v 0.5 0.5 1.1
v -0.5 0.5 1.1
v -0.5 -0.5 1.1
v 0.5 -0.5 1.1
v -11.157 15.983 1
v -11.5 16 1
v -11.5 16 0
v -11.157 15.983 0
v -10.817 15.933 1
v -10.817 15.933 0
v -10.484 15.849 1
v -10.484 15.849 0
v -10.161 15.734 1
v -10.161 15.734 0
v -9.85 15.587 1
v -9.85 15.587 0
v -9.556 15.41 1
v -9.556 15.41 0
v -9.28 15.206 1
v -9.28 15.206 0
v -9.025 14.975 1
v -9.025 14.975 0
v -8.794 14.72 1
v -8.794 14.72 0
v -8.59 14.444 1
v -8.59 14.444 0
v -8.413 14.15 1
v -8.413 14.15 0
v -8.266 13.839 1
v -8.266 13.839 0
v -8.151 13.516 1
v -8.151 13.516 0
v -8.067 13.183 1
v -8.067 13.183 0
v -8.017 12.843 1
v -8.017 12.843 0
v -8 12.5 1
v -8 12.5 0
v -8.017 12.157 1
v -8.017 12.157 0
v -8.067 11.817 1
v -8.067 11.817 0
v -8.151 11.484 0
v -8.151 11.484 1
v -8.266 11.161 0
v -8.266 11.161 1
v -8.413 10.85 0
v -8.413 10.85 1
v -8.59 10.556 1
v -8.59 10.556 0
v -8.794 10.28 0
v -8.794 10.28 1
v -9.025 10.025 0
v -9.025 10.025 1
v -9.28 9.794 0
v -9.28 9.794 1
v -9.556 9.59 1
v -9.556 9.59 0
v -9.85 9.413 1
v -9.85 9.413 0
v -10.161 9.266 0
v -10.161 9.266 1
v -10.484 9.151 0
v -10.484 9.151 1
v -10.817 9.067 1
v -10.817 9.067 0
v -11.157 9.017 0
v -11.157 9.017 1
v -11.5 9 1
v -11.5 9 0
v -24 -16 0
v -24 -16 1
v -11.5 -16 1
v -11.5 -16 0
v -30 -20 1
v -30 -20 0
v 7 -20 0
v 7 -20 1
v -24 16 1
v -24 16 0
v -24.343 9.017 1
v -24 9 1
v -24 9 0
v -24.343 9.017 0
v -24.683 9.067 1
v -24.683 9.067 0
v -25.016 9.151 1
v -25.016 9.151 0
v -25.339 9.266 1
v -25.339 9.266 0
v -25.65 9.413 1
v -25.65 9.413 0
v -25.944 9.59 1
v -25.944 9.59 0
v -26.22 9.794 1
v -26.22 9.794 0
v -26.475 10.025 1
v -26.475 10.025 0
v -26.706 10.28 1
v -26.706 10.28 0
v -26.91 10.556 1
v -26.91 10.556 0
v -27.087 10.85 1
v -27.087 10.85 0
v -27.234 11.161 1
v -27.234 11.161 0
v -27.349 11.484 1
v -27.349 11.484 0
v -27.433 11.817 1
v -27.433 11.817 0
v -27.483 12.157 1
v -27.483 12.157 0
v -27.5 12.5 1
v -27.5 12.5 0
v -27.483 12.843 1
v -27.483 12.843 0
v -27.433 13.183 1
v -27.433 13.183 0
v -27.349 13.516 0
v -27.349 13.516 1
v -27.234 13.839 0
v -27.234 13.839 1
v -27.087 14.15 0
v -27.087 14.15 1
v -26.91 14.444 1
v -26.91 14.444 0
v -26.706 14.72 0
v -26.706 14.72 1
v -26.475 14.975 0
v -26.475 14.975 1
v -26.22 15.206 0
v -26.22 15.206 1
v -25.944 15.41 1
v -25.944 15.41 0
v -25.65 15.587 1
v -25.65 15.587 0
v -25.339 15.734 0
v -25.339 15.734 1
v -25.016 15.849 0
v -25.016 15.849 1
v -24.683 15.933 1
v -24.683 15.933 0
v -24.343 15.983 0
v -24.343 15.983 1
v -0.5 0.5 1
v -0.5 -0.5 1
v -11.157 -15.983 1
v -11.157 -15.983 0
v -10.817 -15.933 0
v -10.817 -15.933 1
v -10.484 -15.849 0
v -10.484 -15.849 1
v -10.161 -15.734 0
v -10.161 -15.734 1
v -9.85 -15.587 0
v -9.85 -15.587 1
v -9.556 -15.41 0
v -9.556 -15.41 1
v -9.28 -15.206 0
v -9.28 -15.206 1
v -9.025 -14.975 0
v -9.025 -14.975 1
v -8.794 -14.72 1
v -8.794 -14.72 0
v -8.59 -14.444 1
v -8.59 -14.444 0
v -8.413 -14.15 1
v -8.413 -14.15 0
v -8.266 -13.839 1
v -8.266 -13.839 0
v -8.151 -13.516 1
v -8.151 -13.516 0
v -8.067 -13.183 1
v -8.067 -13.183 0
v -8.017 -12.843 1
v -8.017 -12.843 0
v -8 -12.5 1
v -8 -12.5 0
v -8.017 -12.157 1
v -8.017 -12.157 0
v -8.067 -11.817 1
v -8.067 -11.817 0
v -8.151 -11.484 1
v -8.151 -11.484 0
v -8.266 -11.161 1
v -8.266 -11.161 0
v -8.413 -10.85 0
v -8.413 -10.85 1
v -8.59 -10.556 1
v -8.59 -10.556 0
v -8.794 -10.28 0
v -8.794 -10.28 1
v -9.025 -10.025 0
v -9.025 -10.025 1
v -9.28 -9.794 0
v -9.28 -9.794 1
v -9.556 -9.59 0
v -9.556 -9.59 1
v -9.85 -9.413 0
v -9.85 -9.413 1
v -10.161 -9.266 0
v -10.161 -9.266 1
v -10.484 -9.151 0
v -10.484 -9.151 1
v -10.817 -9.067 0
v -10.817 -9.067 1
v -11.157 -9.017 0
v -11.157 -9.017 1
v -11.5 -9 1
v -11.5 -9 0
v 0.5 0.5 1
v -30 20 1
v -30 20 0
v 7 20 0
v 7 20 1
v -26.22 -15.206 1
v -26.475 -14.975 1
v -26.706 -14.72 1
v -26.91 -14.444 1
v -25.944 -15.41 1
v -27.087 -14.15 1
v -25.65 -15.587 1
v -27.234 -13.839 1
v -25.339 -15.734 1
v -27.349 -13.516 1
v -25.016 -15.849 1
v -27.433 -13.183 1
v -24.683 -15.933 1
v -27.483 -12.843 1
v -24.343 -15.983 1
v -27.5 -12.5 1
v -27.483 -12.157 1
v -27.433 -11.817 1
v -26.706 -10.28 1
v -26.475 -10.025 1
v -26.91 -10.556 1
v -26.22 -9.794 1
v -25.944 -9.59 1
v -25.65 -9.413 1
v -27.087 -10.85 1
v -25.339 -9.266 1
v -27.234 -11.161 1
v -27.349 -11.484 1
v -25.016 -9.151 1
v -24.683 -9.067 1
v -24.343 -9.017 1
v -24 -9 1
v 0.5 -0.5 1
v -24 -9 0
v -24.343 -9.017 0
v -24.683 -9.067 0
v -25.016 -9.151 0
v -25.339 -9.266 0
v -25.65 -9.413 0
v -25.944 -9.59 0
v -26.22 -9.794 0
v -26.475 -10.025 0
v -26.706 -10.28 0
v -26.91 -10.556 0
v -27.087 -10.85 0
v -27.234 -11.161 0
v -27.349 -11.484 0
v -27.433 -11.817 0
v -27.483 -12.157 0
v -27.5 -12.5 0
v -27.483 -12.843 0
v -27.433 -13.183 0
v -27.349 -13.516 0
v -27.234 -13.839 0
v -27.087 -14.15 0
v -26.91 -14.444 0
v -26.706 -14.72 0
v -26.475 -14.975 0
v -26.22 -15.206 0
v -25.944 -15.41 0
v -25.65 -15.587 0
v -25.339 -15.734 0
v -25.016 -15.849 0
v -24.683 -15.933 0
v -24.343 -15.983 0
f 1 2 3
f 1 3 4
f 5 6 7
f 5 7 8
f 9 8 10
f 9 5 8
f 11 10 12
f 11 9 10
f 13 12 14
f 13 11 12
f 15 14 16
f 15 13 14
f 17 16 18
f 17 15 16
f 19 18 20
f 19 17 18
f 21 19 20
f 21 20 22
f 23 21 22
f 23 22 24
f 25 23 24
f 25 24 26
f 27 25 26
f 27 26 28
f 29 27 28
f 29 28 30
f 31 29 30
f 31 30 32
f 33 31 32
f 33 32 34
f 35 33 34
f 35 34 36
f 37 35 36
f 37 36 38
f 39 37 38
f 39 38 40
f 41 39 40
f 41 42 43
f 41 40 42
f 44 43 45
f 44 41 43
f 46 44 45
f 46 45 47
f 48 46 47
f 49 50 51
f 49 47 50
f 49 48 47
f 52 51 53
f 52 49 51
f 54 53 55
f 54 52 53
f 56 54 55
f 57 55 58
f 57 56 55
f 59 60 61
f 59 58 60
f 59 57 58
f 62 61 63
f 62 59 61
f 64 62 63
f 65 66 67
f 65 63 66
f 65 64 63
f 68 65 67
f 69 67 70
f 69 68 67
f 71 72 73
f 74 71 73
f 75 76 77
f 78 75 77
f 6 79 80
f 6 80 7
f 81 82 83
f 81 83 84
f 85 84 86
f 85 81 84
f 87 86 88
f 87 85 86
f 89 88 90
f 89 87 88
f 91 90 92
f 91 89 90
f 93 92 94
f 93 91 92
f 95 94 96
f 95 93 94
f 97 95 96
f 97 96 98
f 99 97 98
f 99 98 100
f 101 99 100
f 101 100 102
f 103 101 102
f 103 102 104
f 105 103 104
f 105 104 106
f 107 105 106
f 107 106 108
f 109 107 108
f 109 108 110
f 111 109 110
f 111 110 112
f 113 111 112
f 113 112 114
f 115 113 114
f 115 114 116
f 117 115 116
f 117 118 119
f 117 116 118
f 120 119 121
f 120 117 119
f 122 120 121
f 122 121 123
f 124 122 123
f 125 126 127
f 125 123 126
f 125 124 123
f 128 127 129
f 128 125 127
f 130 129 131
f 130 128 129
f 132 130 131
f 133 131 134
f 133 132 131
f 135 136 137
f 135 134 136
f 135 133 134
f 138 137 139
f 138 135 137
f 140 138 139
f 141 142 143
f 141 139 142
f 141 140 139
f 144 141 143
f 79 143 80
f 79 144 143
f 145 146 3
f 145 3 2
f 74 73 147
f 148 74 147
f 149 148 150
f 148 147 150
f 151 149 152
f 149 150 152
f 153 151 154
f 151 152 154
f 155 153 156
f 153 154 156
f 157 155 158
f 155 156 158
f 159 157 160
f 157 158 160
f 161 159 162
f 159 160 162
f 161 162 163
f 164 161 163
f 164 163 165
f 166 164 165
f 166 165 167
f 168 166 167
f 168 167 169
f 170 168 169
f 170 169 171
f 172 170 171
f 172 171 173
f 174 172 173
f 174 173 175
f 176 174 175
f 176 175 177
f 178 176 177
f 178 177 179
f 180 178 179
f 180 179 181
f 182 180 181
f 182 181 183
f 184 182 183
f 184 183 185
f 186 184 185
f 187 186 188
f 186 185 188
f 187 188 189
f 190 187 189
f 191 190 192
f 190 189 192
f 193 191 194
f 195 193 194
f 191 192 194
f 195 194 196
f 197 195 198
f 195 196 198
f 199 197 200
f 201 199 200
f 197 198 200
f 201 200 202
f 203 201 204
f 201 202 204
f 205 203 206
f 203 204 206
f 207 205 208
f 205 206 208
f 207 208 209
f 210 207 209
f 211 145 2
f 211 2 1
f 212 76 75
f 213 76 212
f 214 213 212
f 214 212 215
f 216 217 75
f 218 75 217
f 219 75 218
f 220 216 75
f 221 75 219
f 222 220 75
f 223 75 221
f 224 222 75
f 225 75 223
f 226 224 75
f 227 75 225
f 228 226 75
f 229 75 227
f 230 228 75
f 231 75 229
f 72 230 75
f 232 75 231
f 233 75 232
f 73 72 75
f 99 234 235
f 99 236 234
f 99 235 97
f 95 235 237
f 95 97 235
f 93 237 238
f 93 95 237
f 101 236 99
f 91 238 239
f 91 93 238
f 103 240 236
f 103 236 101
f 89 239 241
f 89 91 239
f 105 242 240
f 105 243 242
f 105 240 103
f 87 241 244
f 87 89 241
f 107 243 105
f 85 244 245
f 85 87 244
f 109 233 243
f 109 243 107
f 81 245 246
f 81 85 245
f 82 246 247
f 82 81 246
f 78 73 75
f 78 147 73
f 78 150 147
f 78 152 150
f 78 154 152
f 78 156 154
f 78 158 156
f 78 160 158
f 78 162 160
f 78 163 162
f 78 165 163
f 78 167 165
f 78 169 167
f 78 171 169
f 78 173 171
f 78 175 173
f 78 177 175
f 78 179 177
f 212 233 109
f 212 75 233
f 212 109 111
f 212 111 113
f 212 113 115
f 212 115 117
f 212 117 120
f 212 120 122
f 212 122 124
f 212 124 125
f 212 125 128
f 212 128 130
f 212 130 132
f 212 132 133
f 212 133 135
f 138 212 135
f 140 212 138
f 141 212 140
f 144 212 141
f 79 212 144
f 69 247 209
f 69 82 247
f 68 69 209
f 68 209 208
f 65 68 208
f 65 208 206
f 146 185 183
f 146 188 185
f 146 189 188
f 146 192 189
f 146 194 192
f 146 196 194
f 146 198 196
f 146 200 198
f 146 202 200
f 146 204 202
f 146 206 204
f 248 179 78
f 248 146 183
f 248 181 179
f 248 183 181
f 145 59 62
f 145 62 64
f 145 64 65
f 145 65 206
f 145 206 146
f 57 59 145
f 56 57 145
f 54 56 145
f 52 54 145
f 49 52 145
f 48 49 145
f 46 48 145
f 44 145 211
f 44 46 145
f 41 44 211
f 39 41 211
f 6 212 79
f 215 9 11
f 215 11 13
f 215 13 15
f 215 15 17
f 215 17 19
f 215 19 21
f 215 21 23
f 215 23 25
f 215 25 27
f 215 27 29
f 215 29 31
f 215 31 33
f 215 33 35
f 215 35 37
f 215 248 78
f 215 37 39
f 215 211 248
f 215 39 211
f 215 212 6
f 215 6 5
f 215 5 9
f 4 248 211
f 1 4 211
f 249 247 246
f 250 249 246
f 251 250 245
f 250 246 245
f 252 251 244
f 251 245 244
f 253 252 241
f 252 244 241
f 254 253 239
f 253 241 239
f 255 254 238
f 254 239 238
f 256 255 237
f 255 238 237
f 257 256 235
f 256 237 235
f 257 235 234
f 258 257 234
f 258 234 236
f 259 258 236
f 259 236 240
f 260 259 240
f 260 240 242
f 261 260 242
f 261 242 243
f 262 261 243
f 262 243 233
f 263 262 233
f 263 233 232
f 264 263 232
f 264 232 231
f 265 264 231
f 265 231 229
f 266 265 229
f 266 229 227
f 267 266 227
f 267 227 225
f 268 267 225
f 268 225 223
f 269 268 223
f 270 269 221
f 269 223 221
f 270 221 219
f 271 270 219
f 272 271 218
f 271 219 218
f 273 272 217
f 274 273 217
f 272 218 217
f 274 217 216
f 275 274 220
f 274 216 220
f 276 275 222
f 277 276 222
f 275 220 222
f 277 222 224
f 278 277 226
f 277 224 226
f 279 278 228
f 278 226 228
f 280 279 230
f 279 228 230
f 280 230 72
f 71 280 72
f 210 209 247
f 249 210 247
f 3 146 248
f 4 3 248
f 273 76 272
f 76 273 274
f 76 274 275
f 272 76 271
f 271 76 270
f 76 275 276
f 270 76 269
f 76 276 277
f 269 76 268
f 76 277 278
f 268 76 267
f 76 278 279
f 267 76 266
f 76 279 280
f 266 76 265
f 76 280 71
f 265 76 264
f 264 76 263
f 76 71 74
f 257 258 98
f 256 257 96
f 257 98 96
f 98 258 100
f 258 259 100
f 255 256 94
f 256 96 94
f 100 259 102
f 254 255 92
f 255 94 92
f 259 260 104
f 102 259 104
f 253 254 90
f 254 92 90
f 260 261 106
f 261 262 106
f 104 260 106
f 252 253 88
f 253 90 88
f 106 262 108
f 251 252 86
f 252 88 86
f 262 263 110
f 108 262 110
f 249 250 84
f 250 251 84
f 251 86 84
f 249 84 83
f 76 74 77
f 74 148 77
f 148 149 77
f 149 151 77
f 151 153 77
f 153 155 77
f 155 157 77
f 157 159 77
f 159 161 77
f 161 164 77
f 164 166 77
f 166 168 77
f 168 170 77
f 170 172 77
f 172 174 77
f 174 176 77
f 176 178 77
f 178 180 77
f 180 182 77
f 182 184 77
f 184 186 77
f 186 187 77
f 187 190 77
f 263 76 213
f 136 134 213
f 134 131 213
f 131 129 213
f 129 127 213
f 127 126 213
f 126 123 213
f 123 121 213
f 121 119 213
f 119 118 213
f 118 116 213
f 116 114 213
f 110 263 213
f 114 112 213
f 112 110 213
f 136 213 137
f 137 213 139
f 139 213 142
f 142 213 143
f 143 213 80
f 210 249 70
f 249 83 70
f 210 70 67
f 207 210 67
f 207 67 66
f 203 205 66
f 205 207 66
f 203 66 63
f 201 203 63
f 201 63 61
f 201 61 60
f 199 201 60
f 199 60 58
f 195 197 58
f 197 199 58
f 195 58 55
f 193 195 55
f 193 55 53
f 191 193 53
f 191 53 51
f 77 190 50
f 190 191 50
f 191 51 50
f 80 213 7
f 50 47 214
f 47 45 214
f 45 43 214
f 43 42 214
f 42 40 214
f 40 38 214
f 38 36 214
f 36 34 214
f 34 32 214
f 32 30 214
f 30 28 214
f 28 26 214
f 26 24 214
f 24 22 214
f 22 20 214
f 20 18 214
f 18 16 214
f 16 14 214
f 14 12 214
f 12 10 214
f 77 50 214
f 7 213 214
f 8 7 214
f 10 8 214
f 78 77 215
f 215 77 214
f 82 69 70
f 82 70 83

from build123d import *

# Parameters (mm, degrees)
SKETCH1_W           = 37
SKETCH1_H           = 40
BOSS_EXTRUDE1_DEPTH = 1
SKETCH2_W           = 1
SKETCH2_H           = 1
BOSS_EXTRUDE2_DEPTH = 0.1
CUT_EXTRUDE1_DEPTH  = 2


with BuildPart() as part:
    # Sketch1 → Boss-Extrude1 (new body)
    with BuildSketch(Plane.XY):
        with Locations((-11.5, 0)):
            Rectangle(SKETCH1_W, SKETCH1_H)
    extrude(amount=BOSS_EXTRUDE1_DEPTH)

    # Sketch2 → Boss-Extrude2 (add)
    with BuildSketch(Plane.XY.offset(1)):
        Rectangle(SKETCH2_W, SKETCH2_H)
    extrude(amount=BOSS_EXTRUDE2_DEPTH)

    # Sketch3 → Cut-Extrude1 (cut, through all)
    with BuildSketch(Plane.XY.offset(1)):
        with BuildLine():
            Line((-24, 16), (-11.5, 16))
            ThreePointArc((-11.5, 16), (-8, 12.5), (-11.5, 9))
            Line((-11.5, 9), (-24, 9))
            ThreePointArc((-24, 9), (-27.5, 12.5), (-24, 16))
        make_face()
    cut_extrude1 = extrude(amount=-CUT_EXTRUDE1_DEPTH, mode=Mode.SUBTRACT)

    # Mirror1: Cut-Extrude1 across plane
    add(cut_extrude1.mirror(Plane.ZX), mode=Mode.SUBTRACT)


solid = part.part
